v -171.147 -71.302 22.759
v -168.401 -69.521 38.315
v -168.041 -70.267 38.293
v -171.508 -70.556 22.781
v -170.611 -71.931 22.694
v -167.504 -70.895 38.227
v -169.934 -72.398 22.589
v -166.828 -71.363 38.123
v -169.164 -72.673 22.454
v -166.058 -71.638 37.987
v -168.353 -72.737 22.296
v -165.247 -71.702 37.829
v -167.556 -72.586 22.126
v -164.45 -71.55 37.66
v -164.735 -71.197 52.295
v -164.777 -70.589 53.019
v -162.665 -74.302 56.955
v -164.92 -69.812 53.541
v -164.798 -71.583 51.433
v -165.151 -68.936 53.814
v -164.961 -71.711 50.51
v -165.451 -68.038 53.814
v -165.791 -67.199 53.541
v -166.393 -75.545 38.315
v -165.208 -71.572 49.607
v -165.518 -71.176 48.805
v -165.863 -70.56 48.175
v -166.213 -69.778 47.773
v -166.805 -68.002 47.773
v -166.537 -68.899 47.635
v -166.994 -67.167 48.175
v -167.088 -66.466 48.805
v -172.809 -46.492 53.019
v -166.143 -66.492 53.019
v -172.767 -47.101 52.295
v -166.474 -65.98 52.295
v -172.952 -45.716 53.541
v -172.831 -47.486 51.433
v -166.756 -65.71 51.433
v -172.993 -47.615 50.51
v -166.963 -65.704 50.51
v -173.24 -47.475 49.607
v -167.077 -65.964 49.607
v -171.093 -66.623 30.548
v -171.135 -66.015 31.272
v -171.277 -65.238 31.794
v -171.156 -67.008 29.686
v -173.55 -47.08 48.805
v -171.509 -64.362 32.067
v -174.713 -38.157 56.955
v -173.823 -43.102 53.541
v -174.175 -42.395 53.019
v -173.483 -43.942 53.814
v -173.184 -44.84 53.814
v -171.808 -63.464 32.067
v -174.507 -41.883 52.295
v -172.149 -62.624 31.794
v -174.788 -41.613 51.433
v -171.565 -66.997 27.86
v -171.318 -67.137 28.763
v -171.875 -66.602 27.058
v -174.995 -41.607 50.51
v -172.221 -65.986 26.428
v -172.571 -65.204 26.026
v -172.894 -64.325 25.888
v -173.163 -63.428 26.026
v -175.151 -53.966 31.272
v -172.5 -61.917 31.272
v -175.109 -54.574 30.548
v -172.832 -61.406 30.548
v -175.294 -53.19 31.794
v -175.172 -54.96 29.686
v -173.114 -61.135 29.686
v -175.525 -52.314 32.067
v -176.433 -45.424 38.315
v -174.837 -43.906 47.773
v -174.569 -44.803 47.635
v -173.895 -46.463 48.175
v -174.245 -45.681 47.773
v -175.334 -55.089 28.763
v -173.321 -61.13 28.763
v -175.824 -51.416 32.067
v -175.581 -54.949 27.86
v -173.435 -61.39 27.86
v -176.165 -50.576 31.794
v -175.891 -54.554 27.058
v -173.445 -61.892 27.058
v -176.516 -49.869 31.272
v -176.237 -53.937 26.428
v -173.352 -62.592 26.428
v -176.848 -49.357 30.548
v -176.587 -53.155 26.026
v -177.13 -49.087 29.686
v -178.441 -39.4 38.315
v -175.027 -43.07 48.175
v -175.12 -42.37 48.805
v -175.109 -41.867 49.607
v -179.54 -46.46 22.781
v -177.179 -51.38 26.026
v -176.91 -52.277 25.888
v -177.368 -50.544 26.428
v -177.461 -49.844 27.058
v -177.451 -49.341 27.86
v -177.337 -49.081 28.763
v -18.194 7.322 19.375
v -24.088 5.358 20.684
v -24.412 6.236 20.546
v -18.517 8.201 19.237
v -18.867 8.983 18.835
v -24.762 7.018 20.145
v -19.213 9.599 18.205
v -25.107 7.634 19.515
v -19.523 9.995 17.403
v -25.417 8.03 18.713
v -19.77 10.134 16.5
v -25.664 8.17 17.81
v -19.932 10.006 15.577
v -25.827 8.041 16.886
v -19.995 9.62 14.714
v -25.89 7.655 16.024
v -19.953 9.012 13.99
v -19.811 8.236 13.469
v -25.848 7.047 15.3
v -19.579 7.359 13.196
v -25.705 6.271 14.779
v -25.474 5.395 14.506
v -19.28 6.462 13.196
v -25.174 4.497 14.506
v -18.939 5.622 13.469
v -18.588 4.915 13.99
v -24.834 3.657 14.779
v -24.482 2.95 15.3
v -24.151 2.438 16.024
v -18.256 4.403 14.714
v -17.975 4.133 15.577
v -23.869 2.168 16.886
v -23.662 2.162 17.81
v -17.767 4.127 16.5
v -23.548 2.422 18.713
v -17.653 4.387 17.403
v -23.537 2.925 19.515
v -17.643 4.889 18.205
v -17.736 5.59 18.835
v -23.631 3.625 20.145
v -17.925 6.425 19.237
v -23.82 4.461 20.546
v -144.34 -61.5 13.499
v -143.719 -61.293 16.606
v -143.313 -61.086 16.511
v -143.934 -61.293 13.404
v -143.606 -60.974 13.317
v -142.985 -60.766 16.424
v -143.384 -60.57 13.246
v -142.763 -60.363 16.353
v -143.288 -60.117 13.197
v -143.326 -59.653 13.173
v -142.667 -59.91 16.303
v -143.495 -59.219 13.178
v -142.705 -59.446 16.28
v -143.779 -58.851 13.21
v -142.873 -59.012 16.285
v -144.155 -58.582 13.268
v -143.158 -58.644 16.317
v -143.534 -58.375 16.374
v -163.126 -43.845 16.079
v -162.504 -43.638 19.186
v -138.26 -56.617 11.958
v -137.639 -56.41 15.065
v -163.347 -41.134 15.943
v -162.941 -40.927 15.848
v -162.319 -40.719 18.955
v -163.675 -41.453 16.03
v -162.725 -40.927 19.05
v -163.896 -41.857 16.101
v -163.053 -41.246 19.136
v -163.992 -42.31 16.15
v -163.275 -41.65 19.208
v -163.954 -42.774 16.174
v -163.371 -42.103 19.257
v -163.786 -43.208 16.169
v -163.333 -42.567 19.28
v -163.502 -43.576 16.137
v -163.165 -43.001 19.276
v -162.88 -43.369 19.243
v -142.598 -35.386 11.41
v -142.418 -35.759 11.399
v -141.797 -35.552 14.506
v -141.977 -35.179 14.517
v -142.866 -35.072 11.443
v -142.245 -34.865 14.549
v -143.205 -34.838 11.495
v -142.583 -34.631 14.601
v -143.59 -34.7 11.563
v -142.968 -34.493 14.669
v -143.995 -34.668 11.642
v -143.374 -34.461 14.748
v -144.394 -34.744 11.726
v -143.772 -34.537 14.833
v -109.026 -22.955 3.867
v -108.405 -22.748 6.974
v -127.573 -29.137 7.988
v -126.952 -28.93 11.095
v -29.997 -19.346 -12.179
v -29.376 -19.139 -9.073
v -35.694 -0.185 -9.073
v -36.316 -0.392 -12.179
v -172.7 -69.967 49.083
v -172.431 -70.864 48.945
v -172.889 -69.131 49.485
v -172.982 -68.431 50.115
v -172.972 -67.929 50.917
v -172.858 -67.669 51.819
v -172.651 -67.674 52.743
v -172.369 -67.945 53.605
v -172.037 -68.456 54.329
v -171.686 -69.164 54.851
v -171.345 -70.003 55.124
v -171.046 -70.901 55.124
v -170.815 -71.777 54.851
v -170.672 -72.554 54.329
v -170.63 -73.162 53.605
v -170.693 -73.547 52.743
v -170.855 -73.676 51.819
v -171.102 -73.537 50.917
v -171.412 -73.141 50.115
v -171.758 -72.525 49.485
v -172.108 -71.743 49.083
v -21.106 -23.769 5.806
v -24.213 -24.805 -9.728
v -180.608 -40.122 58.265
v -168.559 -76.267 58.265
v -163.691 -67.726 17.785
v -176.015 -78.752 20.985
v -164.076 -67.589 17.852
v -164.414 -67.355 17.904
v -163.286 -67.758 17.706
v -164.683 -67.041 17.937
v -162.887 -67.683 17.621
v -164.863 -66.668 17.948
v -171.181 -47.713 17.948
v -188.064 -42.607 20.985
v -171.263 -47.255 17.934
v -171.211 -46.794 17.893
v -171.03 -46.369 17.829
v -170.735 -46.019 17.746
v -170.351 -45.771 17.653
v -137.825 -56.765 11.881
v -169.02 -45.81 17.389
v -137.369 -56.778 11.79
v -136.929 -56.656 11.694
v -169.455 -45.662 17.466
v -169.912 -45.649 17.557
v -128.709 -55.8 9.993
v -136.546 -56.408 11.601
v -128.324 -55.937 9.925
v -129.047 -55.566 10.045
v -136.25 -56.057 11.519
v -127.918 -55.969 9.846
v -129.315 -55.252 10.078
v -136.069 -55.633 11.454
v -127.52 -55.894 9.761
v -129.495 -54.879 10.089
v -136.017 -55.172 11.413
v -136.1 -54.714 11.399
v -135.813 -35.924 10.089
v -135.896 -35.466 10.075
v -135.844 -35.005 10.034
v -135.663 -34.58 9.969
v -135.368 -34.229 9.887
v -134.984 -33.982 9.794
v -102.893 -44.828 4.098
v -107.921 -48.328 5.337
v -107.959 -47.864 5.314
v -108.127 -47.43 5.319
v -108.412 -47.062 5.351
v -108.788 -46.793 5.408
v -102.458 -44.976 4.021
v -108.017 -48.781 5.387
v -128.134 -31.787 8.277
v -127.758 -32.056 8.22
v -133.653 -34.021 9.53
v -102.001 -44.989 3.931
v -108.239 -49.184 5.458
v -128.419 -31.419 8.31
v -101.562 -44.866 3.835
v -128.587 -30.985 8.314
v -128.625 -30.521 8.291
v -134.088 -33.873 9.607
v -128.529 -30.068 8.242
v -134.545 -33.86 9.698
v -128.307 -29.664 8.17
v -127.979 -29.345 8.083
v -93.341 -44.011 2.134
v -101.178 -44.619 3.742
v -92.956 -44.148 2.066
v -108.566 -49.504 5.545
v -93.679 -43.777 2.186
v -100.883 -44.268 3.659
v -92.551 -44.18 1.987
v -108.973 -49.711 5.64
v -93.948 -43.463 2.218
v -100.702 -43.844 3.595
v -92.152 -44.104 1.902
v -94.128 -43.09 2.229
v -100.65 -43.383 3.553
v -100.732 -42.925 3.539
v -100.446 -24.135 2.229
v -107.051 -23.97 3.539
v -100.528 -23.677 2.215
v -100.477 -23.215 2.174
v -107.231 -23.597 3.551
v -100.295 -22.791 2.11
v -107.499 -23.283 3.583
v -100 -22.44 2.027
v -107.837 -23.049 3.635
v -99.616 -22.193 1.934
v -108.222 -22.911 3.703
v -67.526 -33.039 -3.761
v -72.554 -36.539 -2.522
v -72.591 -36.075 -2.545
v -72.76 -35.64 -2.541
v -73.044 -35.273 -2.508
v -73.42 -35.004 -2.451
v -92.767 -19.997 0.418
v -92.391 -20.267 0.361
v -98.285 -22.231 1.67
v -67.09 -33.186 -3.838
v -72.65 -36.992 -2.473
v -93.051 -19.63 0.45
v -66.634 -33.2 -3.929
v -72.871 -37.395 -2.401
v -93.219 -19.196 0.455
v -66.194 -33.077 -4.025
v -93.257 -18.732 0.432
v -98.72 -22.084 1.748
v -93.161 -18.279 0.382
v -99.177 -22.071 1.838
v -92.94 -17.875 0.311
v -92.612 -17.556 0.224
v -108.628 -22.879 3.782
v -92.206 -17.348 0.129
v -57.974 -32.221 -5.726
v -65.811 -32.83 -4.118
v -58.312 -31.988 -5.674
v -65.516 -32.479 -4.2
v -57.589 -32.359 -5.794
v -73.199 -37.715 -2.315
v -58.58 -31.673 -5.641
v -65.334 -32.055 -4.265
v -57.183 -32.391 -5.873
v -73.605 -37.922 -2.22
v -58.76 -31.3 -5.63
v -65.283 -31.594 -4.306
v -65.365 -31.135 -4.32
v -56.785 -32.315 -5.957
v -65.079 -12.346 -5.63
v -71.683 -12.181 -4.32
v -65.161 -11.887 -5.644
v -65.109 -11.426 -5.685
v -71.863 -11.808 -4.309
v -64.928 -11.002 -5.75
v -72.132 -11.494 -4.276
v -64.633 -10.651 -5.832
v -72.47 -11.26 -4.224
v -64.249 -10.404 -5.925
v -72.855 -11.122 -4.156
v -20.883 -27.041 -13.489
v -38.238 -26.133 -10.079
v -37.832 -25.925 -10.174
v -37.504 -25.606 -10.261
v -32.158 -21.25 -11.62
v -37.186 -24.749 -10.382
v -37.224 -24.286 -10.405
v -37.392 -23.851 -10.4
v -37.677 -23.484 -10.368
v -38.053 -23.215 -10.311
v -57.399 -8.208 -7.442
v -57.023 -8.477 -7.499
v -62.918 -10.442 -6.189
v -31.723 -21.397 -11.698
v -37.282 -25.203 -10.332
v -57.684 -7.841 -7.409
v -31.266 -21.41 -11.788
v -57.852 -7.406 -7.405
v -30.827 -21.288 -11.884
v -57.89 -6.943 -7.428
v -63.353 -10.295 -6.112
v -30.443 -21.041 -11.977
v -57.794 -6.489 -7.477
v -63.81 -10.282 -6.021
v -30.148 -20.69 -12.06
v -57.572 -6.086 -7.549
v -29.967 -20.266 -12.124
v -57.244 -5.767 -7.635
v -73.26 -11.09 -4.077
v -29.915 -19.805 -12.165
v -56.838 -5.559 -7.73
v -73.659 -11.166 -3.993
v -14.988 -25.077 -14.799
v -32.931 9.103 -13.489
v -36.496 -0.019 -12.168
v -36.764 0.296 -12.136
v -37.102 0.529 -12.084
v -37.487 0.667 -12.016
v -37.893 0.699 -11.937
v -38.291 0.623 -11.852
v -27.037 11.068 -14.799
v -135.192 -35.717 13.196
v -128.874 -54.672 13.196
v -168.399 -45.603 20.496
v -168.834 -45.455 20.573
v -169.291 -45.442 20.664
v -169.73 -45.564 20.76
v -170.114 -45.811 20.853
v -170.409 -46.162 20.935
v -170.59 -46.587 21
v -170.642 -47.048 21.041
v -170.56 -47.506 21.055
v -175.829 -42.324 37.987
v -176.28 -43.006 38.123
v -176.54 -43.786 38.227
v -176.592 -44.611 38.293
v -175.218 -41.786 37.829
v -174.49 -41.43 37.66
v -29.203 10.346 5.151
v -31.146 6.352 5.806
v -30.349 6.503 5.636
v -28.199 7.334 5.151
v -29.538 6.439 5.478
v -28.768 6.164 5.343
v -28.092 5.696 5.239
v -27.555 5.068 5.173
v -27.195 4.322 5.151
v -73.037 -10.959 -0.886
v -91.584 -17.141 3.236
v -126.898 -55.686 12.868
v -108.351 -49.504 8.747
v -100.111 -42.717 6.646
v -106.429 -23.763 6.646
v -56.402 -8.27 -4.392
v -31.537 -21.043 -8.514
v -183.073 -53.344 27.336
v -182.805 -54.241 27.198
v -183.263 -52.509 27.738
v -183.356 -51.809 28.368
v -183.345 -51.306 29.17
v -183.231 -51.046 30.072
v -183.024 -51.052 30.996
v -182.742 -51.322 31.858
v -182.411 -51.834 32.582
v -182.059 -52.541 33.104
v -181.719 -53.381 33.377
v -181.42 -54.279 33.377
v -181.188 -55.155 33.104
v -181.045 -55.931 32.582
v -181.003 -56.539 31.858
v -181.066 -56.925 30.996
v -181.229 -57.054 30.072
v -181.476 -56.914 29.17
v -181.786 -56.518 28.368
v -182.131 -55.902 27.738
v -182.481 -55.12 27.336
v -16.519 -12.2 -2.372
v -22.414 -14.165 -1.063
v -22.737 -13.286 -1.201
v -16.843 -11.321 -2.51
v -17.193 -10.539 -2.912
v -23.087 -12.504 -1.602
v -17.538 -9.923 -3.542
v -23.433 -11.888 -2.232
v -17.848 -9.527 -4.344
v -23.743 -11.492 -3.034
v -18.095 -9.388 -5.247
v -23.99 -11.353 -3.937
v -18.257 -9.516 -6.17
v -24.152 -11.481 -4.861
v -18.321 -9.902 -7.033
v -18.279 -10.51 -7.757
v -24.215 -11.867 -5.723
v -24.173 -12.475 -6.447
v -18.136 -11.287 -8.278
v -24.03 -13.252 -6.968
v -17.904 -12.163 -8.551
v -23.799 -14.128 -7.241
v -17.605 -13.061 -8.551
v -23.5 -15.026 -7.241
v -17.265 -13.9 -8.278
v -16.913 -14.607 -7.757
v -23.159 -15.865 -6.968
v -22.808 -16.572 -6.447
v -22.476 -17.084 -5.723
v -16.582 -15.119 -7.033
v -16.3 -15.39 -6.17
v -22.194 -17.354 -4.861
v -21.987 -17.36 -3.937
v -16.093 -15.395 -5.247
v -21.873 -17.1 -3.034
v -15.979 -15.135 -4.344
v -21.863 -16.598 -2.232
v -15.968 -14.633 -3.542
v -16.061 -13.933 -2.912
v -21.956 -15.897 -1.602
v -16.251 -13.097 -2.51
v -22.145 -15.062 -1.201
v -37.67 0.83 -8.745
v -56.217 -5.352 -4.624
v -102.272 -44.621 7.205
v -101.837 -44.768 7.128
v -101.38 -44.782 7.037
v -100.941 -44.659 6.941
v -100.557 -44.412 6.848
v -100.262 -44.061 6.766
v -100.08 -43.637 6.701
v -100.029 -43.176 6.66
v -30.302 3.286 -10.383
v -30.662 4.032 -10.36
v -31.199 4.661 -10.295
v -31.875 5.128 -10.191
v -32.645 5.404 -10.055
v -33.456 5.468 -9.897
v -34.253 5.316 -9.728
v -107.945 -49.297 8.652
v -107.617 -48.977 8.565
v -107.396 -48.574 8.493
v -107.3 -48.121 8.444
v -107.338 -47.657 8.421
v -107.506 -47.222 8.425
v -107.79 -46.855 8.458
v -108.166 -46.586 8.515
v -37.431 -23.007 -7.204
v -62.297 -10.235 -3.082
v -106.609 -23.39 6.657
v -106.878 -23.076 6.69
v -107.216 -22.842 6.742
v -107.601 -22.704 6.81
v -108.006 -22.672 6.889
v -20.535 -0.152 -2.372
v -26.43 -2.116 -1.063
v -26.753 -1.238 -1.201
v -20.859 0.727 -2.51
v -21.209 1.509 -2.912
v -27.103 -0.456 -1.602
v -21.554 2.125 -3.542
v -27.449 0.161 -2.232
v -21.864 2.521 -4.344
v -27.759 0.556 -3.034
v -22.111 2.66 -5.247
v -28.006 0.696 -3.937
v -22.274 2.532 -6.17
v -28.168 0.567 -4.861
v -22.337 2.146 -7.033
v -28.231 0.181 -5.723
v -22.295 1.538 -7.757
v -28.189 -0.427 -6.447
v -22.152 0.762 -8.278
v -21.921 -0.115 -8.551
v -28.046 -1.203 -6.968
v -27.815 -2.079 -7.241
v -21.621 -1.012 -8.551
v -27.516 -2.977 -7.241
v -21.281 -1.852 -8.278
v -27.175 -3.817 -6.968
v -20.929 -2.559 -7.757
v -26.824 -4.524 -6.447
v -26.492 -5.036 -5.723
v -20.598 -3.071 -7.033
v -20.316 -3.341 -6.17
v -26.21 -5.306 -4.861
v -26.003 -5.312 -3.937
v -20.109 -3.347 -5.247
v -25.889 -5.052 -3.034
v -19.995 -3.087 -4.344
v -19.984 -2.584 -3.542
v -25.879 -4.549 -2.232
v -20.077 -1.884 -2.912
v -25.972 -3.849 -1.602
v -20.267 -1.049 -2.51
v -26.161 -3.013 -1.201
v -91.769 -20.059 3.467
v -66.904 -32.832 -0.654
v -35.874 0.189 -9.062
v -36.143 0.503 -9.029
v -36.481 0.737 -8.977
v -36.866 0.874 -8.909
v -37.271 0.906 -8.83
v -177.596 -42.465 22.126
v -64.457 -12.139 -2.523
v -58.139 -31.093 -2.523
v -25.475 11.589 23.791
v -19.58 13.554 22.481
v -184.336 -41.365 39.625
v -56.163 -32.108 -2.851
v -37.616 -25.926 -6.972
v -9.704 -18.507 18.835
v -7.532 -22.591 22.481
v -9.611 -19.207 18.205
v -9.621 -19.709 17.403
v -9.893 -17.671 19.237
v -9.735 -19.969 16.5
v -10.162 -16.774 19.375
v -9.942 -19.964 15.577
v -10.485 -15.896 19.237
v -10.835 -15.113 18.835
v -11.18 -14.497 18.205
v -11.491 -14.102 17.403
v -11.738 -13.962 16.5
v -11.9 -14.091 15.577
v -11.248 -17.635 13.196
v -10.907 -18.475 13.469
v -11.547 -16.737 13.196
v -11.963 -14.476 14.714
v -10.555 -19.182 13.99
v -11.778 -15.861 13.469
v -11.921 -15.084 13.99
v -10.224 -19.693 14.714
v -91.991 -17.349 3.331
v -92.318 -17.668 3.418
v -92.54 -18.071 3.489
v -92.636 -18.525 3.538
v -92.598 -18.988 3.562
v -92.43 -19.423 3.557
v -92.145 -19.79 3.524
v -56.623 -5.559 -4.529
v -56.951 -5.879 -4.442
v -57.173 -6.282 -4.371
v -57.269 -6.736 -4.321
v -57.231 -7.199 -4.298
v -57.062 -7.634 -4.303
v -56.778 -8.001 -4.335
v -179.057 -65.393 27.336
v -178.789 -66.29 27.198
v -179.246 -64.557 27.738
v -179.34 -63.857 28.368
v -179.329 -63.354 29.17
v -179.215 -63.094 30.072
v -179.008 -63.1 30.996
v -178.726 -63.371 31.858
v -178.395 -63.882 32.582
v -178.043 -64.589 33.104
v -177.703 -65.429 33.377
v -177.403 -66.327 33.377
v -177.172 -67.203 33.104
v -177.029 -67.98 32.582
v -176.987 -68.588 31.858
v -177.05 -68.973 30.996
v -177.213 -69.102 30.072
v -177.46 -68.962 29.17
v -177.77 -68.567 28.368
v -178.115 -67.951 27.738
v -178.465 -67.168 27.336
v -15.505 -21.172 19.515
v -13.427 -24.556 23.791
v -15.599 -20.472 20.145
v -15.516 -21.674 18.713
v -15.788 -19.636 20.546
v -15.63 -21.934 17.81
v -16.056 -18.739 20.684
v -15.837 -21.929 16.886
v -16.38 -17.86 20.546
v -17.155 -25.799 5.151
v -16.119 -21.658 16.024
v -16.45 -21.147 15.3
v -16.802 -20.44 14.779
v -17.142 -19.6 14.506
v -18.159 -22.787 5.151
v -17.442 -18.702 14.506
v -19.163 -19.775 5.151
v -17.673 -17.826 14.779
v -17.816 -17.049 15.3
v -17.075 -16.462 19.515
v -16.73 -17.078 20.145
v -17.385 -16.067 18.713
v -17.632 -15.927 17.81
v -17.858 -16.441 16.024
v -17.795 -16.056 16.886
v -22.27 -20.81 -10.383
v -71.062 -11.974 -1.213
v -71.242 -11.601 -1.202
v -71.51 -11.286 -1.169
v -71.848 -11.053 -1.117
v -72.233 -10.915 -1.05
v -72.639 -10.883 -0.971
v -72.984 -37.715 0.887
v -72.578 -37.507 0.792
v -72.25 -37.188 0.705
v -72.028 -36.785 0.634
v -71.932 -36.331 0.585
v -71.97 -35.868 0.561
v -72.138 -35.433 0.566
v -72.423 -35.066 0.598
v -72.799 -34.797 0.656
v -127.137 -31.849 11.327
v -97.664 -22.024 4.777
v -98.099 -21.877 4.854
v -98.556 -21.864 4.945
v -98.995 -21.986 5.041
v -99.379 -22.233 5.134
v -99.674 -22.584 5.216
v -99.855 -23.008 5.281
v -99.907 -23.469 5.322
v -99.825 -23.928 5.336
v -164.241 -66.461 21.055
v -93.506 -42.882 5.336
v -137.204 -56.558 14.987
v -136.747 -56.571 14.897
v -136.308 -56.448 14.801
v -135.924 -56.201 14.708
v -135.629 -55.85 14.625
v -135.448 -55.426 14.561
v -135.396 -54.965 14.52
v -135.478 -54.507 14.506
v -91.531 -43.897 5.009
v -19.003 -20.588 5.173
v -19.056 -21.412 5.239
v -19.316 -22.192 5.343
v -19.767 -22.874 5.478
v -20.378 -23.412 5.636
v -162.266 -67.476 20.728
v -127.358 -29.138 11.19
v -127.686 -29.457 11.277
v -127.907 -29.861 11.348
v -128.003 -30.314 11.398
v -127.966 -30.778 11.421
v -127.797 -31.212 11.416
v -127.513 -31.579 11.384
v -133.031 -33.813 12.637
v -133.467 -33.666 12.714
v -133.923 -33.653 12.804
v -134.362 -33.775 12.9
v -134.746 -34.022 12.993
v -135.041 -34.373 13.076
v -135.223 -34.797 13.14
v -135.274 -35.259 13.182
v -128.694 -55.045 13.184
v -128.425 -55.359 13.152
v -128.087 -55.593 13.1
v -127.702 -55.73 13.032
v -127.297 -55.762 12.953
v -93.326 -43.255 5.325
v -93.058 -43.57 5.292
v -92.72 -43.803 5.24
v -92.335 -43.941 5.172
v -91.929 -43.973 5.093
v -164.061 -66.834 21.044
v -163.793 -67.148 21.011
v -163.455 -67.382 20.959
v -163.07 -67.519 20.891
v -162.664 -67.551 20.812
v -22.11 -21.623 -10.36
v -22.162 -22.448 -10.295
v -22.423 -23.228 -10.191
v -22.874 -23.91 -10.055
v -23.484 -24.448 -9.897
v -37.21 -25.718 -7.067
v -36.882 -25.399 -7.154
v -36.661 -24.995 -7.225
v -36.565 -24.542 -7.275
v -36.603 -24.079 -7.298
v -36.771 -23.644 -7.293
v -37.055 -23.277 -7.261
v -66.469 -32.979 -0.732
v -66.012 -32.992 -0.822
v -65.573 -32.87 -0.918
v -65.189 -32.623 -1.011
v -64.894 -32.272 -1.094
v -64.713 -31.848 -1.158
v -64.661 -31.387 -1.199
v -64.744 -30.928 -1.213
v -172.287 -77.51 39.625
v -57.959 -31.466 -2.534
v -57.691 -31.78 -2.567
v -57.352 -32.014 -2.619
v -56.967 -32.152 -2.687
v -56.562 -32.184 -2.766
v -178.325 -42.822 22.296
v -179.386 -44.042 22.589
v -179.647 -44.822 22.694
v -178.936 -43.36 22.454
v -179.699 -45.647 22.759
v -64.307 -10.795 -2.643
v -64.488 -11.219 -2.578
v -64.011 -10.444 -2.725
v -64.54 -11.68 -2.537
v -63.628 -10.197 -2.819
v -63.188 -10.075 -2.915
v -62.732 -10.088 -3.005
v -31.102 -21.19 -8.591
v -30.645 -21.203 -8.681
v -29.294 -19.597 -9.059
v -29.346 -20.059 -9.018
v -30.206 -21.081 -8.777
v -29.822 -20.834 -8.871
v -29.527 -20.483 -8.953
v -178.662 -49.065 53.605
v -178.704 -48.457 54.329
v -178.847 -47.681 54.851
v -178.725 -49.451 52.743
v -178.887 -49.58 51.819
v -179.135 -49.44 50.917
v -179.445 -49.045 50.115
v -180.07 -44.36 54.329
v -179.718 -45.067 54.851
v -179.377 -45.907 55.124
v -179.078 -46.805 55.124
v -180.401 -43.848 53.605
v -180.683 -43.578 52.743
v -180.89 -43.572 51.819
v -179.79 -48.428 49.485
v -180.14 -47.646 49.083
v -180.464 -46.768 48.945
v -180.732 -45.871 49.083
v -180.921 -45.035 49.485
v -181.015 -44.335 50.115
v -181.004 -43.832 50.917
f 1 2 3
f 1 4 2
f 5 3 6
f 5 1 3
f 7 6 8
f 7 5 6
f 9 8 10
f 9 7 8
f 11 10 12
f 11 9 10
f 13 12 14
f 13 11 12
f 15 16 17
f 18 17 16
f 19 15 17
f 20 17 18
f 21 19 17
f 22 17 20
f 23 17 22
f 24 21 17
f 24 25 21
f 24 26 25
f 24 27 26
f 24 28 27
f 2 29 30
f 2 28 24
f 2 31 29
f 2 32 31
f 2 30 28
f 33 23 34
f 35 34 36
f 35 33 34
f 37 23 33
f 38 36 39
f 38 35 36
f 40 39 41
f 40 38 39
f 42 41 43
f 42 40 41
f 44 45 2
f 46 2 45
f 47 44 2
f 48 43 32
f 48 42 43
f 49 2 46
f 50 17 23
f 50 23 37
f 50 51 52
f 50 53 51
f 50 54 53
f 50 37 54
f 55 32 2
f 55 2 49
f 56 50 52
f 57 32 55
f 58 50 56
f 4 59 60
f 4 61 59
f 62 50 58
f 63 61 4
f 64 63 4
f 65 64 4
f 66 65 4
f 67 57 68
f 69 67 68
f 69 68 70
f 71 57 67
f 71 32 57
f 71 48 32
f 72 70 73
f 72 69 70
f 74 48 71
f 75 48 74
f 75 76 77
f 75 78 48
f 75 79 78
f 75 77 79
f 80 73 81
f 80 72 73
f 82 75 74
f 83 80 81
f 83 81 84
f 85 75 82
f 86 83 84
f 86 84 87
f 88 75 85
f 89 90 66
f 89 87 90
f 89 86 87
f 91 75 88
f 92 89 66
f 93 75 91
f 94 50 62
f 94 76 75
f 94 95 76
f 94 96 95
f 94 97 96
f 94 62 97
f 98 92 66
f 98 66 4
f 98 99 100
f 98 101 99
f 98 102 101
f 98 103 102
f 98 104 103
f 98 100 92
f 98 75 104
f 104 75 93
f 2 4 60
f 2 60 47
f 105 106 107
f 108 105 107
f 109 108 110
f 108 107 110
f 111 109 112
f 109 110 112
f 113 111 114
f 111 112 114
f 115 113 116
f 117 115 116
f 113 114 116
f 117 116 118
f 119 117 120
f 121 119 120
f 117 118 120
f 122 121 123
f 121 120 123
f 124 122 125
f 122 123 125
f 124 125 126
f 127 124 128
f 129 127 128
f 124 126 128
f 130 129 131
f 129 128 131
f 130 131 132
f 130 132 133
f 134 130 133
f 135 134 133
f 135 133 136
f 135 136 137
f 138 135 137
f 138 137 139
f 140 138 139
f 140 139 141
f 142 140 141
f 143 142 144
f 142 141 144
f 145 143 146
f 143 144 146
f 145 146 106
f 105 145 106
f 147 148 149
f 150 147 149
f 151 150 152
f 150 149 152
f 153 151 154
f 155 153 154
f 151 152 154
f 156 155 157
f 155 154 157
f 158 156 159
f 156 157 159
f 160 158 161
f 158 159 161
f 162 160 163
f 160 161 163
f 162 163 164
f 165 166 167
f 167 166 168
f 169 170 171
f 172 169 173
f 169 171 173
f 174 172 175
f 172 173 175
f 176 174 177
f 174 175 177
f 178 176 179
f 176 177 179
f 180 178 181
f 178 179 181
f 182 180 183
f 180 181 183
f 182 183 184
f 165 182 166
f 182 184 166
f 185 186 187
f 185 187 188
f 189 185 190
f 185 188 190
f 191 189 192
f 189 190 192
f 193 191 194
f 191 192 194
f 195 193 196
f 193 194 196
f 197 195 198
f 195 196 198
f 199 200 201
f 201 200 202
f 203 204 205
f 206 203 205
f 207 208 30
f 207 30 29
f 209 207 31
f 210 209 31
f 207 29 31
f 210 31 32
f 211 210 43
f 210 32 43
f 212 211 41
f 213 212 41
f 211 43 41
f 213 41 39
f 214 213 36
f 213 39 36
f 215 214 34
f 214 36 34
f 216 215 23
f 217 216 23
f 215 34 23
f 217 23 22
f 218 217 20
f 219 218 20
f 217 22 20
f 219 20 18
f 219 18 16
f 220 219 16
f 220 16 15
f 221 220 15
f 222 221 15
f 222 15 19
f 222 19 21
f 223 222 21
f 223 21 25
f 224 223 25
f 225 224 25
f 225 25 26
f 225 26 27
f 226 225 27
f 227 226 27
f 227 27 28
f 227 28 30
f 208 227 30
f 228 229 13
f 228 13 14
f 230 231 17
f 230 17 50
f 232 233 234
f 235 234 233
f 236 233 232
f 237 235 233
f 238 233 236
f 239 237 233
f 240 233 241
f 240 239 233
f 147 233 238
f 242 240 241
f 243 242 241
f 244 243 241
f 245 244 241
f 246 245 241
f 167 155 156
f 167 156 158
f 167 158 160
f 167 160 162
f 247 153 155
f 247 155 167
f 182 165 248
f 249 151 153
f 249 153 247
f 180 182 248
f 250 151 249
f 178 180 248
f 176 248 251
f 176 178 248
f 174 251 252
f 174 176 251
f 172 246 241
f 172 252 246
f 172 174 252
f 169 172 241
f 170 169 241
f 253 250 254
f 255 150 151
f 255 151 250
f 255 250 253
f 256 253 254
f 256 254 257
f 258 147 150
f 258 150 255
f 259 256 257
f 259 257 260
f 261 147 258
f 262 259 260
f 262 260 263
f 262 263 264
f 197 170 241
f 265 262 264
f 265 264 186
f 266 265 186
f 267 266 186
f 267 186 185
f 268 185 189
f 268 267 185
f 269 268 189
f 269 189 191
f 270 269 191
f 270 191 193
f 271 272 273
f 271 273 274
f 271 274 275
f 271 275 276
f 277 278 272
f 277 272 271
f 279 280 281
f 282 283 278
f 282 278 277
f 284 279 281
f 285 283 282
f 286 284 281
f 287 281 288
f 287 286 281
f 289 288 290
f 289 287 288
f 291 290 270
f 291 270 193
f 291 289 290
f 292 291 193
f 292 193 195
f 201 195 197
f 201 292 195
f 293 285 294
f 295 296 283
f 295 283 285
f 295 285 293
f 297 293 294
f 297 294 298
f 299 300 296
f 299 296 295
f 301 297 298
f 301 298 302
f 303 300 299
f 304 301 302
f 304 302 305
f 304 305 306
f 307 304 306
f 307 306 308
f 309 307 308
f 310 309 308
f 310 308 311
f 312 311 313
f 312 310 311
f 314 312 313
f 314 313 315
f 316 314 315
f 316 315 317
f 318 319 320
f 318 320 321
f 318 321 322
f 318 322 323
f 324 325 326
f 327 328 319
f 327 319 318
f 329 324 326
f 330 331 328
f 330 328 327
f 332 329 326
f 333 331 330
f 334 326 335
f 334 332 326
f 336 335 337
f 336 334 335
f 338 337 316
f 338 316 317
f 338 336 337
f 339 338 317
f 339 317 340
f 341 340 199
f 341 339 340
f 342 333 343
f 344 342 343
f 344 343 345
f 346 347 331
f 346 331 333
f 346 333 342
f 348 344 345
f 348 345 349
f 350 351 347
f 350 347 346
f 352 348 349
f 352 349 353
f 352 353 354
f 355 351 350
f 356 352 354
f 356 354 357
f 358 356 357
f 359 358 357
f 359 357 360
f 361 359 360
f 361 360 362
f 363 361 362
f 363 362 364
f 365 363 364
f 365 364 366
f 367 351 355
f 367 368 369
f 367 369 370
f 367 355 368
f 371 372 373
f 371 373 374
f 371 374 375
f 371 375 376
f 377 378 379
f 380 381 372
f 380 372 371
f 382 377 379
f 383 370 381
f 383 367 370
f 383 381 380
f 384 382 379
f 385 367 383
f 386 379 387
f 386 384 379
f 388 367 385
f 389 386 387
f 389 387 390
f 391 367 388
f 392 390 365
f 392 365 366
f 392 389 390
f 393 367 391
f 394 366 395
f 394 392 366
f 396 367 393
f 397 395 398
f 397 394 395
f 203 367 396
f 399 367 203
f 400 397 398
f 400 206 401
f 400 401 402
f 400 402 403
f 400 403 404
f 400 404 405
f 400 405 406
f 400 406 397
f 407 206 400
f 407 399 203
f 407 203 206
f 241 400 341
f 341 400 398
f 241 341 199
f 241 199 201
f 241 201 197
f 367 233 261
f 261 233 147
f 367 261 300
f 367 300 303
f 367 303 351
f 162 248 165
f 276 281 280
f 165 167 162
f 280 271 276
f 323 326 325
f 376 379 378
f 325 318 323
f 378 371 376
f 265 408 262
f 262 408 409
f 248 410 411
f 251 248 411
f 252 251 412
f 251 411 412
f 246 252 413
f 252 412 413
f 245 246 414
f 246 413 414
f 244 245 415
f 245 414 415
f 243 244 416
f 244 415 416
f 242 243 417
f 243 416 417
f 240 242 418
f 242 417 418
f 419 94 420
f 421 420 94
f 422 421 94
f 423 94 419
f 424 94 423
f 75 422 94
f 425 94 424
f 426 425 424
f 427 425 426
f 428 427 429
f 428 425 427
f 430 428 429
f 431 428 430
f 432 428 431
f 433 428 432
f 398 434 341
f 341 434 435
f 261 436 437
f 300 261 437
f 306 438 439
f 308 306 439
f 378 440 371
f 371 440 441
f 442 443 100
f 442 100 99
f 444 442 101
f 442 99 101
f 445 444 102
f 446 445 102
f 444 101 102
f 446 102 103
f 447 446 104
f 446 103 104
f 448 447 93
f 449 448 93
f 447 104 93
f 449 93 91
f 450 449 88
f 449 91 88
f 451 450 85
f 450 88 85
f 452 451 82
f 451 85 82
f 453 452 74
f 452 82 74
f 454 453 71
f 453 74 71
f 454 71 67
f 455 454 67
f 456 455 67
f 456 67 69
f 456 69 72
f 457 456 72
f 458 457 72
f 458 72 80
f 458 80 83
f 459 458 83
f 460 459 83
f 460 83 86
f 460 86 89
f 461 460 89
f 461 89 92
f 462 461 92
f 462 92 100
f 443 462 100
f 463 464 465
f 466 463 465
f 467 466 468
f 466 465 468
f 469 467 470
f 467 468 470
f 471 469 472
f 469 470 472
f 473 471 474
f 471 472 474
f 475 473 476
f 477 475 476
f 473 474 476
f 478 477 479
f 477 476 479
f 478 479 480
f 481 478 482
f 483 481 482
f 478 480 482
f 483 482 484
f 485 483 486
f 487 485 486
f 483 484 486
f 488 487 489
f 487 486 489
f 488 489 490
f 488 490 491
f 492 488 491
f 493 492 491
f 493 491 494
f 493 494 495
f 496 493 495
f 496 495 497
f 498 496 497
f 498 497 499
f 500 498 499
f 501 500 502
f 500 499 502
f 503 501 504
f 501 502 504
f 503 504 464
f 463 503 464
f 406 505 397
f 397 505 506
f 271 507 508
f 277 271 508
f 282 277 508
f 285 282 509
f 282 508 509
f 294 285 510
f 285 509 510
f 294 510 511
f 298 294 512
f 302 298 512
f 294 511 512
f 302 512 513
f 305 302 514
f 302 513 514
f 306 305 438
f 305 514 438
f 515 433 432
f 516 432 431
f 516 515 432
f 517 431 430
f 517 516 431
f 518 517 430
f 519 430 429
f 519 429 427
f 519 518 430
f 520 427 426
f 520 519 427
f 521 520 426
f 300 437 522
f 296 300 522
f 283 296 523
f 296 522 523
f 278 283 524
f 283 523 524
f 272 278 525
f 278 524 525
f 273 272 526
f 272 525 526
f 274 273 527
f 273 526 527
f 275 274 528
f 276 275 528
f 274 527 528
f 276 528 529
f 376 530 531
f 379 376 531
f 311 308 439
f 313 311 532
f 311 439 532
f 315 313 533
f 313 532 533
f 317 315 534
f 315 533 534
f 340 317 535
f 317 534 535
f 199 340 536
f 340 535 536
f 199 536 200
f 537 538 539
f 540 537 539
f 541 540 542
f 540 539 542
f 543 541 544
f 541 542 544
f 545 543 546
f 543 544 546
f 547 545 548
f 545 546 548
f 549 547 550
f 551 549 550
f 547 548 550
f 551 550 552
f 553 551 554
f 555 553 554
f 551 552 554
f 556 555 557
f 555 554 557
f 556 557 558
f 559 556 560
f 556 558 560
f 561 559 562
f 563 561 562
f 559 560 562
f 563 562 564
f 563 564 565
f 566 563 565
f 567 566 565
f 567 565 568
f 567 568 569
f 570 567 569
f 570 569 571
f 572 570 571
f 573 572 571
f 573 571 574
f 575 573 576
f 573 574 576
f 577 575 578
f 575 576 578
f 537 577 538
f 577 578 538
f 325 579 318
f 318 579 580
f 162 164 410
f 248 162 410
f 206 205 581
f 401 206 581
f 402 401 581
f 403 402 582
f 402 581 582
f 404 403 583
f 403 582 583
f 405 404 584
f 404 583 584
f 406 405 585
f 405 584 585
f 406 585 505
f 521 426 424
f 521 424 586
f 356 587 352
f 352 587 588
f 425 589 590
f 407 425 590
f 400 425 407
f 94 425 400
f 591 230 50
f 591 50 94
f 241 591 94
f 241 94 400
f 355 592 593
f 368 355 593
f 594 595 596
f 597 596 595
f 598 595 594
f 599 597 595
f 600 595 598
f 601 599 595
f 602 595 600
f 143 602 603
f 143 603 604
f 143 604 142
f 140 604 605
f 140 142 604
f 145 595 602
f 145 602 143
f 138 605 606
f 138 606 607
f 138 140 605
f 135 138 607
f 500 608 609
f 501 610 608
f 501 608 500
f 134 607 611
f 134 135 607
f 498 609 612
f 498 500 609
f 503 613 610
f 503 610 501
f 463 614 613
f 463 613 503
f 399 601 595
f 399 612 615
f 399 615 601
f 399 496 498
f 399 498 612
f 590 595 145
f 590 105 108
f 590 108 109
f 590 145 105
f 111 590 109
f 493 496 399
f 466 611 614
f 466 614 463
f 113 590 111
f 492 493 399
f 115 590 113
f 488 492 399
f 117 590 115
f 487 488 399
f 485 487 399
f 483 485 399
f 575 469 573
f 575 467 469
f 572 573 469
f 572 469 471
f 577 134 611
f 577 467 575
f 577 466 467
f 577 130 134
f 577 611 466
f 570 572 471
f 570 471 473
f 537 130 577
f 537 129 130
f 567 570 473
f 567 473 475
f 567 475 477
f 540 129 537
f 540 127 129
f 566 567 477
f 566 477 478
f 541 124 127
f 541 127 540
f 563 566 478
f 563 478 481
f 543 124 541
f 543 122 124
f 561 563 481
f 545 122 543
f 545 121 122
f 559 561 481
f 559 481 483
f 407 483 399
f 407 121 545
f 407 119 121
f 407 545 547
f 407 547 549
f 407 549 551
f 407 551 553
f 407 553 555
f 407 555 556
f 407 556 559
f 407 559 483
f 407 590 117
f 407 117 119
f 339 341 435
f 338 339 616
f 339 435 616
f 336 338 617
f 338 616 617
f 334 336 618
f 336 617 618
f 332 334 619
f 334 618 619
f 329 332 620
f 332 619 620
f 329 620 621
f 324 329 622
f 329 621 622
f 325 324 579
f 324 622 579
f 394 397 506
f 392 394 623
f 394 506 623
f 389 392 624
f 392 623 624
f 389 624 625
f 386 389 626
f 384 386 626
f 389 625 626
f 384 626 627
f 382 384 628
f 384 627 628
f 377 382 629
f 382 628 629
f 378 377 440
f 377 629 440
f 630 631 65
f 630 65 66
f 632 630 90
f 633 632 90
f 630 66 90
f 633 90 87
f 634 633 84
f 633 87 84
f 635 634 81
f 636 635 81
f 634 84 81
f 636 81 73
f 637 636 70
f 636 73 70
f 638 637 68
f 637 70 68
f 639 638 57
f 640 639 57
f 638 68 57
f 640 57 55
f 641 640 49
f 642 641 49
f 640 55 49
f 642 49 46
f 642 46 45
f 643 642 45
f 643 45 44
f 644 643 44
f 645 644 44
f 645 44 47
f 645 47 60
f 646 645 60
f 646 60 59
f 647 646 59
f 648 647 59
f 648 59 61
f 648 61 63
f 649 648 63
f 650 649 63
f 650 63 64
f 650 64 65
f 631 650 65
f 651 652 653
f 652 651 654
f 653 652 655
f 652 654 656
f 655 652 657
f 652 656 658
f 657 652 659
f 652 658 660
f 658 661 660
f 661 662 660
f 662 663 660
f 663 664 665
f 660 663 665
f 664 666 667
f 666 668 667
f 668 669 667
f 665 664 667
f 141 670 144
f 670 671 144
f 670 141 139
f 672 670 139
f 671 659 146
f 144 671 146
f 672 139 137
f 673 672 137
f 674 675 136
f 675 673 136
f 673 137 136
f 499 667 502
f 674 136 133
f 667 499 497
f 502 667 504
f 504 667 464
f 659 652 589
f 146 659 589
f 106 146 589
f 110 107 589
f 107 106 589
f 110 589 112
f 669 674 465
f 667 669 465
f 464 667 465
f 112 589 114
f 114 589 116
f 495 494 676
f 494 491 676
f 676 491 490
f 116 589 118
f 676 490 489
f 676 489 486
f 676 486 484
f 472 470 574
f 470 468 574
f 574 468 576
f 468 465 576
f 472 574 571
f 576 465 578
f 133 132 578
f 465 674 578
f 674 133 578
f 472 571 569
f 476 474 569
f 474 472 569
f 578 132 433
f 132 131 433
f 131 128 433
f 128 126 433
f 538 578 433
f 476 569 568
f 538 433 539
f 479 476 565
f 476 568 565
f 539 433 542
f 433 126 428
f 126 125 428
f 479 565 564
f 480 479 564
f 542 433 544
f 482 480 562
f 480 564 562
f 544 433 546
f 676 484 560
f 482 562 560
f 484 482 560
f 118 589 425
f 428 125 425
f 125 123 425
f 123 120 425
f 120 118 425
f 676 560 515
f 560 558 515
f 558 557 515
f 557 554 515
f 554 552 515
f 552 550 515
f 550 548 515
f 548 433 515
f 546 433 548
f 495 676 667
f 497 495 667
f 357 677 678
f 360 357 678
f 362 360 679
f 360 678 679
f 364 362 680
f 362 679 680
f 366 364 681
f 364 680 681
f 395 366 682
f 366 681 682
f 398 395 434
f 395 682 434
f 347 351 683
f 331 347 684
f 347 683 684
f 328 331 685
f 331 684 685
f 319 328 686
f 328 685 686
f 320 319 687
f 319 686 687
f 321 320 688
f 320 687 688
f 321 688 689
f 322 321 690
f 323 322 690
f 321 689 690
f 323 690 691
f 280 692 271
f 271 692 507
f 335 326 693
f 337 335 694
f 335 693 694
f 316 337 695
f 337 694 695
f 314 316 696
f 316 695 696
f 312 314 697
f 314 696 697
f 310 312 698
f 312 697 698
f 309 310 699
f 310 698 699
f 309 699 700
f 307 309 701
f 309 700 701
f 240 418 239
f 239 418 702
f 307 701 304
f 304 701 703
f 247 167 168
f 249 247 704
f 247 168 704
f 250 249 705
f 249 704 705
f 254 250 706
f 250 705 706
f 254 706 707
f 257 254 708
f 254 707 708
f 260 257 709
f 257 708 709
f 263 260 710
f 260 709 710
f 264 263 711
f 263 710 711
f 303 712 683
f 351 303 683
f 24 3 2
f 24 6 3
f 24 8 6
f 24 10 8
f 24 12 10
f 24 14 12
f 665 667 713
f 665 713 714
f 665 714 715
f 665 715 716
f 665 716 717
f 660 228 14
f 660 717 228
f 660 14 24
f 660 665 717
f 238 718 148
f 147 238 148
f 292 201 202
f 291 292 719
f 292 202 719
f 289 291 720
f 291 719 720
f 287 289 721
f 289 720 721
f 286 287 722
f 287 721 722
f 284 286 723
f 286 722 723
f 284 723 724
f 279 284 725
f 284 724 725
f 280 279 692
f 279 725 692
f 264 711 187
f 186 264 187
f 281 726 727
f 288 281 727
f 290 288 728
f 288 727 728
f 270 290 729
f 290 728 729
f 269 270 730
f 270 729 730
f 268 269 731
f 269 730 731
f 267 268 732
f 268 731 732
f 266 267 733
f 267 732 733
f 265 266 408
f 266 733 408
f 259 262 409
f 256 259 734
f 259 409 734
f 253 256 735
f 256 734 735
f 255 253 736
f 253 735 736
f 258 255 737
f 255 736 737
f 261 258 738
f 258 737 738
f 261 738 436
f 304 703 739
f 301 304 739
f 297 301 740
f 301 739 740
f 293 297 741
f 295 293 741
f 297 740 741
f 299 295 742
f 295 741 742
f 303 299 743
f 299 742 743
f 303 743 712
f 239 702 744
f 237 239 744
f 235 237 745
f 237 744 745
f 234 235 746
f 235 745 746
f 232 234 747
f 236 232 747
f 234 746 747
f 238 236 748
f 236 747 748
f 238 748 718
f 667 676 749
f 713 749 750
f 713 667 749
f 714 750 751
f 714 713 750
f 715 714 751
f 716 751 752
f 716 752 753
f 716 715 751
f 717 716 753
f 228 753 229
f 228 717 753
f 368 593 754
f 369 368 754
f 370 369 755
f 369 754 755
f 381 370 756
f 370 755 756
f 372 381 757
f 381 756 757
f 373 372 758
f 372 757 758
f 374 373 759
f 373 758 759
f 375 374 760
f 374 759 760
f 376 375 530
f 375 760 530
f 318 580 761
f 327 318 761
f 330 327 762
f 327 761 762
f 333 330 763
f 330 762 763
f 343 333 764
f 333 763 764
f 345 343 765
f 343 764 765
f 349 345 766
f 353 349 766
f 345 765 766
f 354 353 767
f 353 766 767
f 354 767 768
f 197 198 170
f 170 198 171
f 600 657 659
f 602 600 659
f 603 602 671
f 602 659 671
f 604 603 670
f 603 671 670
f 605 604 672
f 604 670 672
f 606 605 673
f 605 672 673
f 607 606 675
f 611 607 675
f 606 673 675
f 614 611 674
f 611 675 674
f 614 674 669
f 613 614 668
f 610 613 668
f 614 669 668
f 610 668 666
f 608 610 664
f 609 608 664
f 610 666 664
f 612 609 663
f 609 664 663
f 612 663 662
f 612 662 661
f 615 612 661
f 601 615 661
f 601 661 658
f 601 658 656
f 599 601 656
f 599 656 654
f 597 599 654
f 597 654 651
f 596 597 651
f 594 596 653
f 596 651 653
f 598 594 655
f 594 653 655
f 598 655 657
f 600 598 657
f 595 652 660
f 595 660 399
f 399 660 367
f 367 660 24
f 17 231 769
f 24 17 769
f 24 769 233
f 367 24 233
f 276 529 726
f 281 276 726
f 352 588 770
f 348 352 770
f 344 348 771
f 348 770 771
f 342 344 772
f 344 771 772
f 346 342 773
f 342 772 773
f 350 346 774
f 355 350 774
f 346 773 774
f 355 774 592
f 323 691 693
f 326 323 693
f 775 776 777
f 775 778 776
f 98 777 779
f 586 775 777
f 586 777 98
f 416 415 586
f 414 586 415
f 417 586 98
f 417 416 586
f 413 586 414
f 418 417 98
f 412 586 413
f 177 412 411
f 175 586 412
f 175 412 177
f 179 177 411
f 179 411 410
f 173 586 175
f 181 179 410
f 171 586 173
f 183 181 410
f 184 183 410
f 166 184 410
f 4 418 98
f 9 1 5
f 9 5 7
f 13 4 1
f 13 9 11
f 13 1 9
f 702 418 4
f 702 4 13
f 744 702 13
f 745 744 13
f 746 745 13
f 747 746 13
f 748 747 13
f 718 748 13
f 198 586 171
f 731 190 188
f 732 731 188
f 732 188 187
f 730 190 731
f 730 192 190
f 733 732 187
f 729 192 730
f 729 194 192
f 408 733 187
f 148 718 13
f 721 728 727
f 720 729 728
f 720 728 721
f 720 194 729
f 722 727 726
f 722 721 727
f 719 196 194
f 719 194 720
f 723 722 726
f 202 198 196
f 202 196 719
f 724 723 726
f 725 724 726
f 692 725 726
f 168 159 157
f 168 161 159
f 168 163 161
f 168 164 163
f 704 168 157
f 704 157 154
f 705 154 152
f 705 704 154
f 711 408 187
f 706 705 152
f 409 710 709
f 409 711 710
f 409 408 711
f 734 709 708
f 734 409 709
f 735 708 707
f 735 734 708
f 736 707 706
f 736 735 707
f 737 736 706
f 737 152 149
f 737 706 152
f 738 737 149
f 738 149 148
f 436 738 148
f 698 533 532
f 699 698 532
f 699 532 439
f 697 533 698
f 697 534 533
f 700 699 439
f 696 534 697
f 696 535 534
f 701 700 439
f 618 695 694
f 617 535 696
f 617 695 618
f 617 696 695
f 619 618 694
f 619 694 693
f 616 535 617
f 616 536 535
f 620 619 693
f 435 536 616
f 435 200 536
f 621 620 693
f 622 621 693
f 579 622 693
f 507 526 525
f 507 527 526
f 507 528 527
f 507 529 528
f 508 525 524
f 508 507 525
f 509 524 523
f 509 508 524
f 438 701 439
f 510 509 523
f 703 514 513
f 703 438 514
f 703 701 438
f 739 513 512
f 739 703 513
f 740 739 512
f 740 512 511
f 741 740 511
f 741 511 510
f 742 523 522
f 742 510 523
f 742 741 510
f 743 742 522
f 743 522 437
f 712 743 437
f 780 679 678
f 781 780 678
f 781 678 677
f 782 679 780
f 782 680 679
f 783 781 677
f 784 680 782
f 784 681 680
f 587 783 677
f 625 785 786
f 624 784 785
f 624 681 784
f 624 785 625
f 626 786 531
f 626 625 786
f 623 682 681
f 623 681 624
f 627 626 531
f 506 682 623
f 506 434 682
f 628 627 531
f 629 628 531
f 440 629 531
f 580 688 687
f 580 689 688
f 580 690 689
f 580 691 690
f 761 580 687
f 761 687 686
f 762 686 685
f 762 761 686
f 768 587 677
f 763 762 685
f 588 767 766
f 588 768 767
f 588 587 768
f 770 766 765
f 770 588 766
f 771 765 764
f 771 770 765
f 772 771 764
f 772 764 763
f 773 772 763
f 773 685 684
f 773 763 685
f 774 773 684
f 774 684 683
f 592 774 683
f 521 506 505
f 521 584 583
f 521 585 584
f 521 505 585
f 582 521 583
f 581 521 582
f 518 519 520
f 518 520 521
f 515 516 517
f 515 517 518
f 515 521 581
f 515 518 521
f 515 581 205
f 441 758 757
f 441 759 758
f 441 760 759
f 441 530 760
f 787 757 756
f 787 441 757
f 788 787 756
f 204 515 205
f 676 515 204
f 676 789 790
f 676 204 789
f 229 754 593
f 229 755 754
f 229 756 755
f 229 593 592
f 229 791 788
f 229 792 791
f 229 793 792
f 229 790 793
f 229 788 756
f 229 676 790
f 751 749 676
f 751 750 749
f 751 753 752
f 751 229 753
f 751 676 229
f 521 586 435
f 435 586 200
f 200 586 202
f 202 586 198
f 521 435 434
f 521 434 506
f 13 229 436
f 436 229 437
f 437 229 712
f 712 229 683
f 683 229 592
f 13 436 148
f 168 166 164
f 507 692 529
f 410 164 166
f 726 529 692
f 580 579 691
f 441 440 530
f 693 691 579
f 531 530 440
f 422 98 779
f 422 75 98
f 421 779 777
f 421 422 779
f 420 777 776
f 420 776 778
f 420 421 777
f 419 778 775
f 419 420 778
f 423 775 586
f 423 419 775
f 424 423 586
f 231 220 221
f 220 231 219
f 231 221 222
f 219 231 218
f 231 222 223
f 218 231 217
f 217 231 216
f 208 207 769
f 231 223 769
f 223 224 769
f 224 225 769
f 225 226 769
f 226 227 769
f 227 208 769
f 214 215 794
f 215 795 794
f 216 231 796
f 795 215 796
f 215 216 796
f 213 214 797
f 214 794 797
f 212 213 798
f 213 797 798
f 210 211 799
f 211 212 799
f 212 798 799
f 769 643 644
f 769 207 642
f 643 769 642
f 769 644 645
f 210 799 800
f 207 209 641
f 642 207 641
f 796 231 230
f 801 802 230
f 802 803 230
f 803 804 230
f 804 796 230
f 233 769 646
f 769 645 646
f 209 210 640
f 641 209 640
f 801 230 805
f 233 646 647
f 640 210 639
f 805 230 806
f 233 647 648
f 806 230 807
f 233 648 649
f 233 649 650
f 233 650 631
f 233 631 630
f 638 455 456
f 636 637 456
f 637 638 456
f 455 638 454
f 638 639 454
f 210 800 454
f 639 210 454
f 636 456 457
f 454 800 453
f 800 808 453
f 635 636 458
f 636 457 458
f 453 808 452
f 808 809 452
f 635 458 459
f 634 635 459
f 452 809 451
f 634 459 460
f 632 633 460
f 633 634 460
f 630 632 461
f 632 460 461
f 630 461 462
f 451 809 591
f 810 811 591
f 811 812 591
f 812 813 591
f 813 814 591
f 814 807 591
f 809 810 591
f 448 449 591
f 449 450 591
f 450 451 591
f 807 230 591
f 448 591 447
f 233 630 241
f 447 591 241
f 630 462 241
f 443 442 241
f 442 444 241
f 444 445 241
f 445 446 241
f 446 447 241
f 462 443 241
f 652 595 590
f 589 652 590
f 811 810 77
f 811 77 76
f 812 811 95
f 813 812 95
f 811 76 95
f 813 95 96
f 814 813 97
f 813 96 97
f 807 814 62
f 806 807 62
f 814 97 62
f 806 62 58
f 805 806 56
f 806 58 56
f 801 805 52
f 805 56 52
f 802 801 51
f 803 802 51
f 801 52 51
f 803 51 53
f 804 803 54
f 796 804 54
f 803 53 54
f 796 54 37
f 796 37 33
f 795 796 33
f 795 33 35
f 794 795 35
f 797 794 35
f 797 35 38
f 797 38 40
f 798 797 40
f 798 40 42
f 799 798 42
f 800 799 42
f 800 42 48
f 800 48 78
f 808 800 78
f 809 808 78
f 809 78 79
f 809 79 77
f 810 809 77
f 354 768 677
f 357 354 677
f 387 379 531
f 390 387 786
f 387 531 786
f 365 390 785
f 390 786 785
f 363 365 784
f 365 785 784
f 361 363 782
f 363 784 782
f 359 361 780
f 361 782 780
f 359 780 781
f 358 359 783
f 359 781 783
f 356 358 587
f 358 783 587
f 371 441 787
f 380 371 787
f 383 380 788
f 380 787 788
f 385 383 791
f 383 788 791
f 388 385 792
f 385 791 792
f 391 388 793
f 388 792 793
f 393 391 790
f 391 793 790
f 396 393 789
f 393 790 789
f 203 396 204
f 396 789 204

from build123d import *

# Parameters (mm, degrees)
SKETCH1_W                       = 38.1
SKETCH1_H                       = 38.1
BOSS_EXTRUDE1_DEPTH             = 6.35
BOSS_EXTRUDE2_DEPTH             = 167.118447297
SKETCH3_W                       = 38.1
SKETCH3_H                       = 38.1
BOSS_EXTRUDE3_DEPTH             = 6.35
FILLET1_R                       = 3.175
F_1_4_0_25_DIAMETER_HOLE1_D     = 6.35
F_1_4_0_25_DIAMETER_HOLE1_DEPTH = 6.35
F_1_4_0_25_DIAMETER_HOLE2_D     = 6.35
CUT_EXTRUDE1_REACH              = 215.764


with BuildPart() as part:
    # Sketch1 → Boss-Extrude1 (new body)
    with BuildSketch(Plane(origin=(-17.28438521, -5.761461737, 3.840974491), x_dir=(-0.1956984219160322, -0.06523280730534455, -0.9784921095801634), z_dir=(0.9282791216329135, 0.3094263738776401, -0.20628424925175834))):
        Rectangle(SKETCH1_W, SKETCH1_H)
    extrude(amount=-BOSS_EXTRUDE1_DEPTH)

    # Sketch2 → Boss-Extrude2 (add)
    with BuildSketch(Plane(origin=(-23.178957633, -7.726319211, 5.150879474), x_dir=(0.19569842191603226, 0.06523280730534461, 0.9784921095801634), z_dir=(-0.9282791216329135, -0.3094263738776404, 0.20628424925175842))):
        Polygon((-19.05, 19.05), (0, 19.05), (0, 15.875), (-15.875, 15.875), (-15.875, -15.875), (0, -15.875), (0, -19.05), (-19.05, -19.05), align=None)
    extrude(amount=BOSS_EXTRUDE2_DEPTH)

    # Sketch3 → Boss-Extrude3 (add)
    with BuildSketch(Plane(origin=(-178.311523099, -59.437174366, 39.624782911), x_dir=(-0.19569842191603198, -0.0652328073053445, -0.9784921095801634), z_dir=(0.9282791216329136, 0.30942637387764027, -0.20628424925175817))):
        Rectangle(SKETCH3_W, SKETCH3_H)
    extrude(amount=BOSS_EXTRUDE3_DEPTH)

    # Fillet1
    fillet1_edges = [part.edges().sort_by_distance(p)[0] for p in [
        (-29.752429642, 6.816242738, -2.615901646),
        (-19.712198071, -23.304451975, -2.615901646),
        (-178.990422686, -42.929754944, 30.548096808),
        (-168.950191115, -73.050449657, 30.548096808),
    ]]
    fillet(fillet1_edges, radius=FILLET1_R)

    # 1/4 (0.25) Diameter Hole1
    with Locations(Plane(origin=(-17.28438521, -5.761461737, 3.840974491), x_dir=(-0.19569842191603223, -0.0652328073053446, -0.9784921095801634), z_dir=(0.9282791216329135, 0.3094263738776401, -0.20628424925175837))):
        with Locations((-12.7, 12.7), (-12.7, -12.7), (9.525, 6.35), (9.525, -6.35)):
            Hole(F_1_4_0_25_DIAMETER_HOLE1_D / 2, depth=F_1_4_0_25_DIAMETER_HOLE1_DEPTH)

    # 1/4 (0.25) Diameter Hole2 (through all)
    with Locations(Plane(origin=(-178.311523099, -59.437174366, 39.624782911), x_dir=(0.19569842191603223, 0.06523280730534461, 0.9784921095801634), z_dir=(-0.9282791216329135, -0.3094263738776401, 0.2062842492517584))):
        with Locations((12.7, 12.7), (12.7, -12.7), (-9.525, -6.35), (-9.525, 6.35)):
            Hole(F_1_4_0_25_DIAMETER_HOLE2_D / 2)

    # Sketch10 → Cut-Extrude1 (cut, up to next)
    with BuildSketch(Plane(origin=(-3.106712448, -1.035570816, -15.53356224), x_dir=(0.9806641258145292, -0.013017665386918594, -0.19526498080377744), z_dir=(0.1956984219160322, 0.06523280730534471, 0.9784921095801634)), mode=Mode.PRIVATE) as cut_extrude1_sk1:
        with BuildLine():
            Line((-26.787357564, -18.493233536), (-33.230145008, 0.419416497))
            ThreePointArc((-33.230145008, 0.419416497), (-34.032250279, 1.332050316), (-35.244753917, 1.410205802))
            Line((-35.244753917, 1.410205802), (-54.15740395, -5.032581643))
            ThreePointArc((-54.15740395, -5.032581643), (-55.229706496, -6.433165686), (-54.346087984, -7.95982437))
            Line((-54.346087984, -7.95982437), (-28.990650506, -20.429686959))
            ThreePointArc((-28.990650506, -20.429686959), (-27.24205563, -20.197556886), (-26.787357564, -18.493233536))
        make_face()
    cut_extrude1_tool1 = extrude(cut_extrude1_sk1.sketch, amount=-CUT_EXTRUDE1_REACH, mode=Mode.PRIVATE) & part.part
    # Sketch10 → Cut-Extrude1 (cut, up to next)
    with BuildSketch(Plane(origin=(-3.106712448, -1.035570816, -15.53356224), x_dir=(0.9806641258145292, -0.013017665386918594, -0.19526498080377744), z_dir=(0.1956984219160322, 0.06523280730534471, 0.9784921095801634)), mode=Mode.PRIVATE) as cut_extrude1_sk2:
        with BuildLine():
            Line((-35.001446932, -22.477326167), (-60.35688441, -10.007463578))
            ThreePointArc((-60.35688441, -10.007463578), (-62.105479286, -10.239593651), (-62.560177352, -11.943917001))
            Line((-62.560177352, -11.943917001), (-56.117389908, -30.856567035))
            ThreePointArc((-56.117389908, -30.856567035), (-55.315284637, -31.769200853), (-54.102780999, -31.847356339))
            Line((-54.102780999, -31.847356339), (-35.190130966, -25.404568895))
            ThreePointArc((-35.190130966, -25.404568895), (-34.11782842, -24.003984851), (-35.001446932, -22.477326167))
        make_face()
    cut_extrude1_tool2 = extrude(cut_extrude1_sk2.sketch, amount=-CUT_EXTRUDE1_REACH, mode=Mode.PRIVATE) & part.part
    # Sketch10 → Cut-Extrude1 (cut, up to next)
    with BuildSketch(Plane(origin=(-3.106712448, -1.035570816, -15.53356224), x_dir=(0.9806641258145292, -0.013017665386918594, -0.19526498080377744), z_dir=(0.1956984219160322, 0.06523280730534471, 0.9784921095801634)), mode=Mode.PRIVATE) as cut_extrude1_sk3:
        with BuildLine():
            Line((-62.852136119, -30.779068786), (-69.294923563, -11.866418753))
            ThreePointArc((-69.294923563, -11.866418753), (-70.097028834, -10.953784934), (-71.309532471, -10.875629448))
            Line((-71.309532471, -10.875629448), (-90.222182505, -17.318416892))
            ThreePointArc((-90.222182505, -17.318416892), (-91.294485051, -18.719000936), (-90.410866539, -20.24565962))
            Line((-90.410866539, -20.24565962), (-65.055429061, -32.715522209))
            ThreePointArc((-65.055429061, -32.715522209), (-63.306834185, -32.483392136), (-62.852136119, -30.779068786))
        make_face()
    cut_extrude1_tool3 = extrude(cut_extrude1_sk3.sketch, amount=-CUT_EXTRUDE1_REACH, mode=Mode.PRIVATE) & part.part
    # Sketch10 → Cut-Extrude1 (cut, up to next)
    with BuildSketch(Plane(origin=(-3.106712448, -1.035570816, -15.53356224), x_dir=(0.9806641258145292, -0.013017665386918594, -0.19526498080377744), z_dir=(0.1956984219160322, 0.06523280730534471, 0.9784921095801634)), mode=Mode.PRIVATE) as cut_extrude1_sk4:
        with BuildLine():
            Line((-71.066225487, -34.763161417), (-96.421662965, -22.293298828))
            ThreePointArc((-96.421662965, -22.293298828), (-98.170257841, -22.525428901), (-98.624955907, -24.229752251))
            Line((-98.624955907, -24.229752251), (-92.182168463, -43.142402284))
            ThreePointArc((-92.182168463, -43.142402284), (-91.380063192, -44.055036103), (-90.167559554, -44.133191589))
            Line((-90.167559554, -44.133191589), (-71.254909521, -37.690404145))
            ThreePointArc((-71.254909521, -37.690404145), (-70.182606975, -36.289820101), (-71.066225487, -34.763161417))
        make_face()
    cut_extrude1_tool4 = extrude(cut_extrude1_sk4.sketch, amount=-CUT_EXTRUDE1_REACH, mode=Mode.PRIVATE) & part.part
    # Sketch10 → Cut-Extrude1 (cut, up to next)
    with BuildSketch(Plane(origin=(-3.106712448, -1.035570816, -15.53356224), x_dir=(0.9806641258145292, -0.013017665386918594, -0.19526498080377744), z_dir=(0.1956984219160322, 0.06523280730534471, 0.9784921095801634)), mode=Mode.PRIVATE) as cut_extrude1_sk5:
        with BuildLine():
            Line((-98.916914674, -43.064904036), (-105.359702118, -24.152254002))
            ThreePointArc((-105.359702118, -24.152254002), (-106.161807388, -23.239620184), (-107.374311026, -23.161464698))
            Line((-107.374311026, -23.161464698), (-126.28696106, -29.604252142))
            ThreePointArc((-126.28696106, -29.604252142), (-127.359263606, -31.004836186), (-126.475645094, -32.531494869))
            Line((-126.475645094, -32.531494869), (-101.120207616, -45.001357459))
            ThreePointArc((-101.120207616, -45.001357459), (-99.371612739, -44.769227386), (-98.916914674, -43.064904036))
        make_face()
    cut_extrude1_tool5 = extrude(cut_extrude1_sk5.sketch, amount=-CUT_EXTRUDE1_REACH, mode=Mode.PRIVATE) & part.part
    # Sketch10 → Cut-Extrude1 (cut, up to next)
    with BuildSketch(Plane(origin=(-3.106712448, -1.035570816, -15.53356224), x_dir=(0.9806641258145292, -0.013017665386918594, -0.19526498080377744), z_dir=(0.1956984219160322, 0.06523280730534471, 0.9784921095801634)), mode=Mode.PRIVATE) as cut_extrude1_sk6:
        with BuildLine():
            Line((-107.131004042, -47.048996667), (-132.48644152, -34.579134078))
            ThreePointArc((-132.48644152, -34.579134078), (-134.235036396, -34.811264151), (-134.689734462, -36.5155875))
            Line((-134.689734462, -36.5155875), (-128.246947018, -55.428237534))
            ThreePointArc((-128.246947018, -55.428237534), (-127.444841747, -56.340871353), (-126.232338109, -56.419026839))
            Line((-126.232338109, -56.419026839), (-107.319688075, -49.976239394))
            ThreePointArc((-107.319688075, -49.976239394), (-106.247385529, -48.575655351), (-107.131004042, -47.048996667))
        make_face()
    cut_extrude1_tool6 = extrude(cut_extrude1_sk6.sketch, amount=-CUT_EXTRUDE1_REACH, mode=Mode.PRIVATE) & part.part
    # Sketch10 → Cut-Extrude1 (cut, up to next)
    with BuildSketch(Plane(origin=(-3.106712448, -1.035570816, -15.53356224), x_dir=(0.9806641258145292, -0.013017665386918594, -0.19526498080377744), z_dir=(0.1956984219160322, 0.06523280730534471, 0.9784921095801634)), mode=Mode.PRIVATE) as cut_extrude1_sk7:
        with BuildLine():
            Line((-134.981693228, -55.350739286), (-141.424480673, -36.438089252))
            ThreePointArc((-141.424480673, -36.438089252), (-142.226585943, -35.525455434), (-143.439089581, -35.447299948))
            Line((-143.439089581, -35.447299948), (-162.351739615, -41.890087392))
            ThreePointArc((-162.351739615, -41.890087392), (-163.424042161, -43.290671435), (-162.540423649, -44.817330119))
            Line((-162.540423649, -44.817330119), (-137.184986171, -57.287192709))
            ThreePointArc((-137.184986171, -57.287192709), (-135.436391294, -57.055062636), (-134.981693228, -55.350739286))
        make_face()
    cut_extrude1_tool7 = extrude(cut_extrude1_sk7.sketch, amount=-CUT_EXTRUDE1_REACH, mode=Mode.PRIVATE) & part.part
    # Sketch10 → Cut-Extrude1 (cut, up to next)
    with BuildSketch(Plane(origin=(-3.106712448, -1.035570816, -15.53356224), x_dir=(0.9806641258145292, -0.013017665386918594, -0.19526498080377744), z_dir=(0.1956984219160322, 0.06523280730534471, 0.9784921095801634)), mode=Mode.PRIVATE) as cut_extrude1_sk8:
        with BuildLine():
            Line((-143.195782597, -59.334831917), (-168.551220075, -46.864969328))
            ThreePointArc((-168.551220075, -46.864969328), (-170.299814951, -47.0970994), (-170.754513017, -48.80142275))
            Line((-170.754513017, -48.80142275), (-164.311725573, -67.714072784))
            ThreePointArc((-164.311725573, -67.714072784), (-163.509620302, -68.626706603), (-162.297116664, -68.704862089))
            Line((-162.297116664, -68.704862089), (-143.38446663, -62.262074644))
            ThreePointArc((-143.38446663, -62.262074644), (-142.312164084, -60.861490601), (-143.195782597, -59.334831917))
        make_face()
    cut_extrude1_tool8 = extrude(cut_extrude1_sk8.sketch, amount=-CUT_EXTRUDE1_REACH, mode=Mode.PRIVATE) & part.part
    add(cut_extrude1_tool1.solids().sort_by_distance((-41.341778, -9.255249, -7.338571))[0], mode=Mode.SUBTRACT)
    add(cut_extrude1_tool2.solids().sort_by_distance((-52.491569, -22.022534, -4.25746))[0], mode=Mode.SUBTRACT)
    add(cut_extrude1_tool3.solids().sort_by_distance((-76.709213, -21.044393, 0.520859))[0], mode=Mode.SUBTRACT)
    add(cut_extrude1_tool4.solids().sort_by_distance((-87.859003, -33.811679, 3.60197))[0], mode=Mode.SUBTRACT)
    add(cut_extrude1_tool5.solids().sort_by_distance((-112.076647, -32.833538, 8.380289))[0], mode=Mode.SUBTRACT)
    add(cut_extrude1_tool6.solids().sort_by_distance((-123.226438, -45.600823, 11.4614))[0], mode=Mode.SUBTRACT)
    add(cut_extrude1_tool7.solids().sort_by_distance((-147.444082, -44.622683, 16.239719))[0], mode=Mode.SUBTRACT)
    add(cut_extrude1_tool8.solids().sort_by_distance((-158.593872, -57.389968, 19.32083))[0], mode=Mode.SUBTRACT)


solid = part.part
